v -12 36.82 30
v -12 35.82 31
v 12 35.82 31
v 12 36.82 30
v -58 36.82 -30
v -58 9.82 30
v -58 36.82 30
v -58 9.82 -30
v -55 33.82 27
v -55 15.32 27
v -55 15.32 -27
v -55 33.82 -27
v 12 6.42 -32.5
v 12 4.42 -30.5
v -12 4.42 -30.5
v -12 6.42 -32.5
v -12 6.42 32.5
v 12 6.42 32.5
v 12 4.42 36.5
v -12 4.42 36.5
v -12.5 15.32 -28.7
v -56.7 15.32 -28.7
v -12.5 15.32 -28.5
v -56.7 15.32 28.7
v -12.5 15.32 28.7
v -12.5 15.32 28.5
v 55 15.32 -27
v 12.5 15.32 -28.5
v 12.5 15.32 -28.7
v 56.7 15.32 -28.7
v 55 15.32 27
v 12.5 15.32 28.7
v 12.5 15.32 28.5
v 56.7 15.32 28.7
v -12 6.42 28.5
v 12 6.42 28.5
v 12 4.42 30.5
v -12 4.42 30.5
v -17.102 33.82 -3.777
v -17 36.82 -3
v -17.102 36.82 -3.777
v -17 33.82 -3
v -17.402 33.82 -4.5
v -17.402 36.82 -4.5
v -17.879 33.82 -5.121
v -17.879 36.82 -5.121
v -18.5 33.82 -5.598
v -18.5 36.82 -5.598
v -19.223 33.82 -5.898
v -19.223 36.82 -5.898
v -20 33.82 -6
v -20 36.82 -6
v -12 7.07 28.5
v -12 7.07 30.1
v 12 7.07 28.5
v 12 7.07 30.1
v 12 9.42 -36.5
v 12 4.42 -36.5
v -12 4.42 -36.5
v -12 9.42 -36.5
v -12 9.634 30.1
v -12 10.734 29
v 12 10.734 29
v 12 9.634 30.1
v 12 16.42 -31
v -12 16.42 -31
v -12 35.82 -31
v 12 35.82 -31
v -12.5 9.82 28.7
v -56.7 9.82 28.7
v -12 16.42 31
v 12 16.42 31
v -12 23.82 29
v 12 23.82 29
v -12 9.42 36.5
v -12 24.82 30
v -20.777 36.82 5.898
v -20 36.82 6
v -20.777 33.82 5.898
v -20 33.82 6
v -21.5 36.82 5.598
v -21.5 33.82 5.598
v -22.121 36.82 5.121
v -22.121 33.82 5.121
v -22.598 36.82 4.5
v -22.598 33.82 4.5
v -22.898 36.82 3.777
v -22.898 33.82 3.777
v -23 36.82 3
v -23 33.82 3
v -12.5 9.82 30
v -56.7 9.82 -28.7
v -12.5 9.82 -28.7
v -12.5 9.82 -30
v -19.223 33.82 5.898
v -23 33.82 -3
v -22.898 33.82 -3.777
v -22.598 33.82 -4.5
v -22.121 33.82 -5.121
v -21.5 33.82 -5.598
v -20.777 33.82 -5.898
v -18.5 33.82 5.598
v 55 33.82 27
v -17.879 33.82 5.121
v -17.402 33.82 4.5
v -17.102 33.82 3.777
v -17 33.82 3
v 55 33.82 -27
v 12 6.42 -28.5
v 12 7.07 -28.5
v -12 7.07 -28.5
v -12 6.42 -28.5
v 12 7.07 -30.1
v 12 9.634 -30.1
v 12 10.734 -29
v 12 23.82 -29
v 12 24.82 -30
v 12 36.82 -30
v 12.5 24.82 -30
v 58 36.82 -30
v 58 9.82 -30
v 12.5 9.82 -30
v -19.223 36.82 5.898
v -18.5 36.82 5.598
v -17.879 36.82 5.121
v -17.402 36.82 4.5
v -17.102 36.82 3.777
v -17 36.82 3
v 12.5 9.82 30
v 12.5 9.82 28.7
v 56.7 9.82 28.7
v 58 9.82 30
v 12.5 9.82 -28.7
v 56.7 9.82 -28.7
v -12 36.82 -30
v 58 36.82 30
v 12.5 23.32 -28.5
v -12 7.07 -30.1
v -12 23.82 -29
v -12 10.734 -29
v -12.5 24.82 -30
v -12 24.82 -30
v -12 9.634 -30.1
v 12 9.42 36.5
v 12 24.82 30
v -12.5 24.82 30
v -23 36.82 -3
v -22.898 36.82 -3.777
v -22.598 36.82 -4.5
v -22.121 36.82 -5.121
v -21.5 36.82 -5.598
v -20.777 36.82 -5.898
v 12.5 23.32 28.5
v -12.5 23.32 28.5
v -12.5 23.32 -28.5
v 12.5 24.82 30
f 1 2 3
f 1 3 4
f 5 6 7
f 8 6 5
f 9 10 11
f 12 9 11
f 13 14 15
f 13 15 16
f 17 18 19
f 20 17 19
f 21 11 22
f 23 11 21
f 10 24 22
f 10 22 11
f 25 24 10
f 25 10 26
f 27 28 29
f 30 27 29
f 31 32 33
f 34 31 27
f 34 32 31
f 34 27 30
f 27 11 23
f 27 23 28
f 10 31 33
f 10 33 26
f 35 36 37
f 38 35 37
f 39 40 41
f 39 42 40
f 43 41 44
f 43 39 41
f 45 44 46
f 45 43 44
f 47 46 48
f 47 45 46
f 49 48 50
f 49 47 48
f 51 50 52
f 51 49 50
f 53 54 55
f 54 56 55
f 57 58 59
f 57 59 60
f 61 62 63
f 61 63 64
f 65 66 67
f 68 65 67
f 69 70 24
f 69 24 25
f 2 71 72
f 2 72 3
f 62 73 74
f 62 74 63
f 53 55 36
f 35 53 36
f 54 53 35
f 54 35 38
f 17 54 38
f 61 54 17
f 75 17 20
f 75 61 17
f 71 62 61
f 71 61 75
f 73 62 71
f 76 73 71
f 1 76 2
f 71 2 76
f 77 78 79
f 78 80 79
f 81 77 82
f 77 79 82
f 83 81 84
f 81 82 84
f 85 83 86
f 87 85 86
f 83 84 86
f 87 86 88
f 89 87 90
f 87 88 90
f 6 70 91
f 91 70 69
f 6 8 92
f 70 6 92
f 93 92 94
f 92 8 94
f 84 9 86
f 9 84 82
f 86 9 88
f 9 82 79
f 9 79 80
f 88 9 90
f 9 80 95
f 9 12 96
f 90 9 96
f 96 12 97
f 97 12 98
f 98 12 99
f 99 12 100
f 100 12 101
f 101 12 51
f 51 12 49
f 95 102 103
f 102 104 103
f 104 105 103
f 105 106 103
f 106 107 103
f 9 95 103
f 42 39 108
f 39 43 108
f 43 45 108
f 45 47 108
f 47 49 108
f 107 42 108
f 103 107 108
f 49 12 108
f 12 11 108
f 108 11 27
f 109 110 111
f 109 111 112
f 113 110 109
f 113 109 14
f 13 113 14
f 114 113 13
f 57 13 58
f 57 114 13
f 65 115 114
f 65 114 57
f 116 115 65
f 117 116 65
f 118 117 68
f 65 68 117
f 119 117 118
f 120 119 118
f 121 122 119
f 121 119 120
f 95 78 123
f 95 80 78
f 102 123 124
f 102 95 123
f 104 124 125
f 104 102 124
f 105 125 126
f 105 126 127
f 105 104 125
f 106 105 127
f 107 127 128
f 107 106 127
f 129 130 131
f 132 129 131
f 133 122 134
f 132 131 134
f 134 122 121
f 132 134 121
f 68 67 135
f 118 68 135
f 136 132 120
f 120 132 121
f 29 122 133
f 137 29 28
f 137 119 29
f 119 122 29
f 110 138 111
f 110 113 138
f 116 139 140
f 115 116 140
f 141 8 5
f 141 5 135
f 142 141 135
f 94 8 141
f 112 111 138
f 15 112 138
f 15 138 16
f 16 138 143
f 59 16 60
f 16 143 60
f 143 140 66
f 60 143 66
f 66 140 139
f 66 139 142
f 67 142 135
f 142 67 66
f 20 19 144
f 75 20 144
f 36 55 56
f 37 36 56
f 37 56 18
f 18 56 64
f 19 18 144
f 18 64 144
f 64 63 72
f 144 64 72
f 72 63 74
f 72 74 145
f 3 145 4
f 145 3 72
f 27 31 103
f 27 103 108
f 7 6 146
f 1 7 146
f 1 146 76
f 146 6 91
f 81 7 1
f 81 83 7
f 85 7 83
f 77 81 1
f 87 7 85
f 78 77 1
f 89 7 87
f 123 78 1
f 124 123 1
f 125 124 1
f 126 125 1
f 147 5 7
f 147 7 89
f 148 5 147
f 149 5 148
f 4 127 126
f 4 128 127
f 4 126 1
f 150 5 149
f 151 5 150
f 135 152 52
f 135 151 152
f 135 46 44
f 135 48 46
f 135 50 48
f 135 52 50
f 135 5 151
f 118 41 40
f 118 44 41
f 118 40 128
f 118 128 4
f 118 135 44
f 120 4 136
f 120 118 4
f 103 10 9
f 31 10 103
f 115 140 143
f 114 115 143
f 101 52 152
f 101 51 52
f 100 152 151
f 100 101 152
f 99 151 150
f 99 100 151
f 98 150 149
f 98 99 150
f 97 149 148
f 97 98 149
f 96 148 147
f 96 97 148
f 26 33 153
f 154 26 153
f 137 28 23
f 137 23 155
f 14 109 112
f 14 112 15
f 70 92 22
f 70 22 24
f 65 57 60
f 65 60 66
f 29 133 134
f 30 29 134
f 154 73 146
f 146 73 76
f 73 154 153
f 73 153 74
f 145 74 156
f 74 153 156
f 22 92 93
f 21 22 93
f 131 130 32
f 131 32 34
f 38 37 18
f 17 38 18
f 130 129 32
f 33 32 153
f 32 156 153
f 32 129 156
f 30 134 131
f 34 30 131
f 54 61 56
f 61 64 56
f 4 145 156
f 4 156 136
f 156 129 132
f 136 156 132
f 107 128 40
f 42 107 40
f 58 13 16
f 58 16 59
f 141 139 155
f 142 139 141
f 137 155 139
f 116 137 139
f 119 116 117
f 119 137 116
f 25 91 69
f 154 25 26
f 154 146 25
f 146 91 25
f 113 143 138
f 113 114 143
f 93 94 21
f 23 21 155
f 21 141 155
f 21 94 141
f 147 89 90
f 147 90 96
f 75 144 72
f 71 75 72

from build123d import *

# Parameters (mm, degrees)
SKETCH1_W           = 116
SKETCH1_H           = 60
SKETCH1_W_2         = 110
SKETCH1_H_2         = 54
BOSS_EXTRUDE1_DEPTH = 24
SKETCH2_W           = 116
SKETCH2_H           = 60
BOSS_EXTRUDE2_DEPTH = 3
CUT_EXTRUDE1_DEPTH  = 12.5
BOSS_EXTRUDE3_DEPTH = 12
SKETCH5_W           = 113.4
SKETCH5_H           = 57.4
SKETCH5_W_2         = 110
SKETCH5_H_2         = 54
CUT_EXTRUDE2_DEPTH  = 5.5
CUT_EXTRUDE3_REACH  = 77.802
SKETCH6_W           = 6
SKETCH6_H           = 12
FILLET3_R           = 3


with BuildPart() as part:
    # Sketch1 → Boss-Extrude1 (new body)
    with BuildSketch(Plane(origin=(0, 9.820251789, 0), x_dir=(1, 0, 0), z_dir=(0, 1, 0))):
        Rectangle(SKETCH1_W, SKETCH1_H)
        Rectangle(SKETCH1_W_2, SKETCH1_H_2, mode=Mode.SUBTRACT)
    extrude(amount=BOSS_EXTRUDE1_DEPTH)

    # Sketch2 → Boss-Extrude2 (add)
    with BuildSketch(Plane(origin=(0, 33.820251789, 0), x_dir=(1, 0, 0), z_dir=(0, 1, 0))):
        Rectangle(SKETCH2_W, SKETCH2_H)
    extrude(amount=BOSS_EXTRUDE2_DEPTH)

    # Sketch3 → Cut-Extrude1 (cut, symmetric)
    with BuildSketch(Plane(origin=(0, 0, 0), x_dir=(0, 0, -1), z_dir=(1, 0, 0))):
        Polygon((28.5, 9.820251789), (28.5, 23.320251789), (30, 24.820251789), (30, 9.820251789), align=None)
    cut_extrude1 = extrude(amount=CUT_EXTRUDE1_DEPTH, both=True, mode=Mode.SUBTRACT)

    # Sketch4 → Boss-Extrude3 (add, symmetric)
    with BuildSketch(Plane(origin=(0, 0, 0), x_dir=(0, 0, -1), z_dir=(1, 0, 0))):
        Polygon((30.1, 7.070251789), (28.5, 7.070251789), (28.5, 6.420251789), (30.5, 4.420251789), (32.5, 6.420251789), (36.5, 4.420251789), (36.5, 9.420251789), (31, 16.420251789), (31, 35.820251789), (30, 36.820251789), (29, 36.820251789), (29, 10.734465351), (30.1, 9.634465351), align=None)
    boss_extrude3 = extrude(amount=BOSS_EXTRUDE3_DEPTH, both=True)

    # Sketch5 → Cut-Extrude2 (cut)
    with BuildSketch(Plane.XZ.offset(-9.820251789)):
        Rectangle(SKETCH5_W, SKETCH5_H)
        Rectangle(SKETCH5_W_2, SKETCH5_H_2, mode=Mode.SUBTRACT)
    extrude(amount=-CUT_EXTRUDE2_DEPTH, mode=Mode.SUBTRACT)

    # Mirror1: Cut-Extrude1, Boss-Extrude3 across plane
    add(cut_extrude1.mirror(Plane.XY), mode=Mode.SUBTRACT)
    add(boss_extrude3.mirror(Plane.XY))

    # Sketch6 → Cut-Extrude3 (cut, up to next)
    with BuildSketch(Plane(origin=(0, 36.820251789, 0), x_dir=(1, 0, 0), z_dir=(0, 1, 0)), mode=Mode.PRIVATE) as cut_extrude3_sk1:
        with Locations((-20, 0)):
            Rectangle(SKETCH6_W, SKETCH6_H)
    cut_extrude3_tool1 = extrude(cut_extrude3_sk1.sketch, amount=-CUT_EXTRUDE3_REACH, mode=Mode.PRIVATE) & part.part
    add(cut_extrude3_tool1.solids().sort_by_distance((-20, 36.820252, 0))[0], mode=Mode.SUBTRACT)

    # Fillet3
    fillet3_edges = [part.edges().sort_by_distance(p)[0] for p in [
        (-23, 35.320251789, 6),
        (-17, 35.320251789, 6),
        (-17, 35.320251789, -6),
        (-23, 35.320251789, -6),
    ]]
    fillet(fillet3_edges, radius=FILLET3_R - 0.0001)  # a hair under: the kernel refuses the full size


solid = part.part
